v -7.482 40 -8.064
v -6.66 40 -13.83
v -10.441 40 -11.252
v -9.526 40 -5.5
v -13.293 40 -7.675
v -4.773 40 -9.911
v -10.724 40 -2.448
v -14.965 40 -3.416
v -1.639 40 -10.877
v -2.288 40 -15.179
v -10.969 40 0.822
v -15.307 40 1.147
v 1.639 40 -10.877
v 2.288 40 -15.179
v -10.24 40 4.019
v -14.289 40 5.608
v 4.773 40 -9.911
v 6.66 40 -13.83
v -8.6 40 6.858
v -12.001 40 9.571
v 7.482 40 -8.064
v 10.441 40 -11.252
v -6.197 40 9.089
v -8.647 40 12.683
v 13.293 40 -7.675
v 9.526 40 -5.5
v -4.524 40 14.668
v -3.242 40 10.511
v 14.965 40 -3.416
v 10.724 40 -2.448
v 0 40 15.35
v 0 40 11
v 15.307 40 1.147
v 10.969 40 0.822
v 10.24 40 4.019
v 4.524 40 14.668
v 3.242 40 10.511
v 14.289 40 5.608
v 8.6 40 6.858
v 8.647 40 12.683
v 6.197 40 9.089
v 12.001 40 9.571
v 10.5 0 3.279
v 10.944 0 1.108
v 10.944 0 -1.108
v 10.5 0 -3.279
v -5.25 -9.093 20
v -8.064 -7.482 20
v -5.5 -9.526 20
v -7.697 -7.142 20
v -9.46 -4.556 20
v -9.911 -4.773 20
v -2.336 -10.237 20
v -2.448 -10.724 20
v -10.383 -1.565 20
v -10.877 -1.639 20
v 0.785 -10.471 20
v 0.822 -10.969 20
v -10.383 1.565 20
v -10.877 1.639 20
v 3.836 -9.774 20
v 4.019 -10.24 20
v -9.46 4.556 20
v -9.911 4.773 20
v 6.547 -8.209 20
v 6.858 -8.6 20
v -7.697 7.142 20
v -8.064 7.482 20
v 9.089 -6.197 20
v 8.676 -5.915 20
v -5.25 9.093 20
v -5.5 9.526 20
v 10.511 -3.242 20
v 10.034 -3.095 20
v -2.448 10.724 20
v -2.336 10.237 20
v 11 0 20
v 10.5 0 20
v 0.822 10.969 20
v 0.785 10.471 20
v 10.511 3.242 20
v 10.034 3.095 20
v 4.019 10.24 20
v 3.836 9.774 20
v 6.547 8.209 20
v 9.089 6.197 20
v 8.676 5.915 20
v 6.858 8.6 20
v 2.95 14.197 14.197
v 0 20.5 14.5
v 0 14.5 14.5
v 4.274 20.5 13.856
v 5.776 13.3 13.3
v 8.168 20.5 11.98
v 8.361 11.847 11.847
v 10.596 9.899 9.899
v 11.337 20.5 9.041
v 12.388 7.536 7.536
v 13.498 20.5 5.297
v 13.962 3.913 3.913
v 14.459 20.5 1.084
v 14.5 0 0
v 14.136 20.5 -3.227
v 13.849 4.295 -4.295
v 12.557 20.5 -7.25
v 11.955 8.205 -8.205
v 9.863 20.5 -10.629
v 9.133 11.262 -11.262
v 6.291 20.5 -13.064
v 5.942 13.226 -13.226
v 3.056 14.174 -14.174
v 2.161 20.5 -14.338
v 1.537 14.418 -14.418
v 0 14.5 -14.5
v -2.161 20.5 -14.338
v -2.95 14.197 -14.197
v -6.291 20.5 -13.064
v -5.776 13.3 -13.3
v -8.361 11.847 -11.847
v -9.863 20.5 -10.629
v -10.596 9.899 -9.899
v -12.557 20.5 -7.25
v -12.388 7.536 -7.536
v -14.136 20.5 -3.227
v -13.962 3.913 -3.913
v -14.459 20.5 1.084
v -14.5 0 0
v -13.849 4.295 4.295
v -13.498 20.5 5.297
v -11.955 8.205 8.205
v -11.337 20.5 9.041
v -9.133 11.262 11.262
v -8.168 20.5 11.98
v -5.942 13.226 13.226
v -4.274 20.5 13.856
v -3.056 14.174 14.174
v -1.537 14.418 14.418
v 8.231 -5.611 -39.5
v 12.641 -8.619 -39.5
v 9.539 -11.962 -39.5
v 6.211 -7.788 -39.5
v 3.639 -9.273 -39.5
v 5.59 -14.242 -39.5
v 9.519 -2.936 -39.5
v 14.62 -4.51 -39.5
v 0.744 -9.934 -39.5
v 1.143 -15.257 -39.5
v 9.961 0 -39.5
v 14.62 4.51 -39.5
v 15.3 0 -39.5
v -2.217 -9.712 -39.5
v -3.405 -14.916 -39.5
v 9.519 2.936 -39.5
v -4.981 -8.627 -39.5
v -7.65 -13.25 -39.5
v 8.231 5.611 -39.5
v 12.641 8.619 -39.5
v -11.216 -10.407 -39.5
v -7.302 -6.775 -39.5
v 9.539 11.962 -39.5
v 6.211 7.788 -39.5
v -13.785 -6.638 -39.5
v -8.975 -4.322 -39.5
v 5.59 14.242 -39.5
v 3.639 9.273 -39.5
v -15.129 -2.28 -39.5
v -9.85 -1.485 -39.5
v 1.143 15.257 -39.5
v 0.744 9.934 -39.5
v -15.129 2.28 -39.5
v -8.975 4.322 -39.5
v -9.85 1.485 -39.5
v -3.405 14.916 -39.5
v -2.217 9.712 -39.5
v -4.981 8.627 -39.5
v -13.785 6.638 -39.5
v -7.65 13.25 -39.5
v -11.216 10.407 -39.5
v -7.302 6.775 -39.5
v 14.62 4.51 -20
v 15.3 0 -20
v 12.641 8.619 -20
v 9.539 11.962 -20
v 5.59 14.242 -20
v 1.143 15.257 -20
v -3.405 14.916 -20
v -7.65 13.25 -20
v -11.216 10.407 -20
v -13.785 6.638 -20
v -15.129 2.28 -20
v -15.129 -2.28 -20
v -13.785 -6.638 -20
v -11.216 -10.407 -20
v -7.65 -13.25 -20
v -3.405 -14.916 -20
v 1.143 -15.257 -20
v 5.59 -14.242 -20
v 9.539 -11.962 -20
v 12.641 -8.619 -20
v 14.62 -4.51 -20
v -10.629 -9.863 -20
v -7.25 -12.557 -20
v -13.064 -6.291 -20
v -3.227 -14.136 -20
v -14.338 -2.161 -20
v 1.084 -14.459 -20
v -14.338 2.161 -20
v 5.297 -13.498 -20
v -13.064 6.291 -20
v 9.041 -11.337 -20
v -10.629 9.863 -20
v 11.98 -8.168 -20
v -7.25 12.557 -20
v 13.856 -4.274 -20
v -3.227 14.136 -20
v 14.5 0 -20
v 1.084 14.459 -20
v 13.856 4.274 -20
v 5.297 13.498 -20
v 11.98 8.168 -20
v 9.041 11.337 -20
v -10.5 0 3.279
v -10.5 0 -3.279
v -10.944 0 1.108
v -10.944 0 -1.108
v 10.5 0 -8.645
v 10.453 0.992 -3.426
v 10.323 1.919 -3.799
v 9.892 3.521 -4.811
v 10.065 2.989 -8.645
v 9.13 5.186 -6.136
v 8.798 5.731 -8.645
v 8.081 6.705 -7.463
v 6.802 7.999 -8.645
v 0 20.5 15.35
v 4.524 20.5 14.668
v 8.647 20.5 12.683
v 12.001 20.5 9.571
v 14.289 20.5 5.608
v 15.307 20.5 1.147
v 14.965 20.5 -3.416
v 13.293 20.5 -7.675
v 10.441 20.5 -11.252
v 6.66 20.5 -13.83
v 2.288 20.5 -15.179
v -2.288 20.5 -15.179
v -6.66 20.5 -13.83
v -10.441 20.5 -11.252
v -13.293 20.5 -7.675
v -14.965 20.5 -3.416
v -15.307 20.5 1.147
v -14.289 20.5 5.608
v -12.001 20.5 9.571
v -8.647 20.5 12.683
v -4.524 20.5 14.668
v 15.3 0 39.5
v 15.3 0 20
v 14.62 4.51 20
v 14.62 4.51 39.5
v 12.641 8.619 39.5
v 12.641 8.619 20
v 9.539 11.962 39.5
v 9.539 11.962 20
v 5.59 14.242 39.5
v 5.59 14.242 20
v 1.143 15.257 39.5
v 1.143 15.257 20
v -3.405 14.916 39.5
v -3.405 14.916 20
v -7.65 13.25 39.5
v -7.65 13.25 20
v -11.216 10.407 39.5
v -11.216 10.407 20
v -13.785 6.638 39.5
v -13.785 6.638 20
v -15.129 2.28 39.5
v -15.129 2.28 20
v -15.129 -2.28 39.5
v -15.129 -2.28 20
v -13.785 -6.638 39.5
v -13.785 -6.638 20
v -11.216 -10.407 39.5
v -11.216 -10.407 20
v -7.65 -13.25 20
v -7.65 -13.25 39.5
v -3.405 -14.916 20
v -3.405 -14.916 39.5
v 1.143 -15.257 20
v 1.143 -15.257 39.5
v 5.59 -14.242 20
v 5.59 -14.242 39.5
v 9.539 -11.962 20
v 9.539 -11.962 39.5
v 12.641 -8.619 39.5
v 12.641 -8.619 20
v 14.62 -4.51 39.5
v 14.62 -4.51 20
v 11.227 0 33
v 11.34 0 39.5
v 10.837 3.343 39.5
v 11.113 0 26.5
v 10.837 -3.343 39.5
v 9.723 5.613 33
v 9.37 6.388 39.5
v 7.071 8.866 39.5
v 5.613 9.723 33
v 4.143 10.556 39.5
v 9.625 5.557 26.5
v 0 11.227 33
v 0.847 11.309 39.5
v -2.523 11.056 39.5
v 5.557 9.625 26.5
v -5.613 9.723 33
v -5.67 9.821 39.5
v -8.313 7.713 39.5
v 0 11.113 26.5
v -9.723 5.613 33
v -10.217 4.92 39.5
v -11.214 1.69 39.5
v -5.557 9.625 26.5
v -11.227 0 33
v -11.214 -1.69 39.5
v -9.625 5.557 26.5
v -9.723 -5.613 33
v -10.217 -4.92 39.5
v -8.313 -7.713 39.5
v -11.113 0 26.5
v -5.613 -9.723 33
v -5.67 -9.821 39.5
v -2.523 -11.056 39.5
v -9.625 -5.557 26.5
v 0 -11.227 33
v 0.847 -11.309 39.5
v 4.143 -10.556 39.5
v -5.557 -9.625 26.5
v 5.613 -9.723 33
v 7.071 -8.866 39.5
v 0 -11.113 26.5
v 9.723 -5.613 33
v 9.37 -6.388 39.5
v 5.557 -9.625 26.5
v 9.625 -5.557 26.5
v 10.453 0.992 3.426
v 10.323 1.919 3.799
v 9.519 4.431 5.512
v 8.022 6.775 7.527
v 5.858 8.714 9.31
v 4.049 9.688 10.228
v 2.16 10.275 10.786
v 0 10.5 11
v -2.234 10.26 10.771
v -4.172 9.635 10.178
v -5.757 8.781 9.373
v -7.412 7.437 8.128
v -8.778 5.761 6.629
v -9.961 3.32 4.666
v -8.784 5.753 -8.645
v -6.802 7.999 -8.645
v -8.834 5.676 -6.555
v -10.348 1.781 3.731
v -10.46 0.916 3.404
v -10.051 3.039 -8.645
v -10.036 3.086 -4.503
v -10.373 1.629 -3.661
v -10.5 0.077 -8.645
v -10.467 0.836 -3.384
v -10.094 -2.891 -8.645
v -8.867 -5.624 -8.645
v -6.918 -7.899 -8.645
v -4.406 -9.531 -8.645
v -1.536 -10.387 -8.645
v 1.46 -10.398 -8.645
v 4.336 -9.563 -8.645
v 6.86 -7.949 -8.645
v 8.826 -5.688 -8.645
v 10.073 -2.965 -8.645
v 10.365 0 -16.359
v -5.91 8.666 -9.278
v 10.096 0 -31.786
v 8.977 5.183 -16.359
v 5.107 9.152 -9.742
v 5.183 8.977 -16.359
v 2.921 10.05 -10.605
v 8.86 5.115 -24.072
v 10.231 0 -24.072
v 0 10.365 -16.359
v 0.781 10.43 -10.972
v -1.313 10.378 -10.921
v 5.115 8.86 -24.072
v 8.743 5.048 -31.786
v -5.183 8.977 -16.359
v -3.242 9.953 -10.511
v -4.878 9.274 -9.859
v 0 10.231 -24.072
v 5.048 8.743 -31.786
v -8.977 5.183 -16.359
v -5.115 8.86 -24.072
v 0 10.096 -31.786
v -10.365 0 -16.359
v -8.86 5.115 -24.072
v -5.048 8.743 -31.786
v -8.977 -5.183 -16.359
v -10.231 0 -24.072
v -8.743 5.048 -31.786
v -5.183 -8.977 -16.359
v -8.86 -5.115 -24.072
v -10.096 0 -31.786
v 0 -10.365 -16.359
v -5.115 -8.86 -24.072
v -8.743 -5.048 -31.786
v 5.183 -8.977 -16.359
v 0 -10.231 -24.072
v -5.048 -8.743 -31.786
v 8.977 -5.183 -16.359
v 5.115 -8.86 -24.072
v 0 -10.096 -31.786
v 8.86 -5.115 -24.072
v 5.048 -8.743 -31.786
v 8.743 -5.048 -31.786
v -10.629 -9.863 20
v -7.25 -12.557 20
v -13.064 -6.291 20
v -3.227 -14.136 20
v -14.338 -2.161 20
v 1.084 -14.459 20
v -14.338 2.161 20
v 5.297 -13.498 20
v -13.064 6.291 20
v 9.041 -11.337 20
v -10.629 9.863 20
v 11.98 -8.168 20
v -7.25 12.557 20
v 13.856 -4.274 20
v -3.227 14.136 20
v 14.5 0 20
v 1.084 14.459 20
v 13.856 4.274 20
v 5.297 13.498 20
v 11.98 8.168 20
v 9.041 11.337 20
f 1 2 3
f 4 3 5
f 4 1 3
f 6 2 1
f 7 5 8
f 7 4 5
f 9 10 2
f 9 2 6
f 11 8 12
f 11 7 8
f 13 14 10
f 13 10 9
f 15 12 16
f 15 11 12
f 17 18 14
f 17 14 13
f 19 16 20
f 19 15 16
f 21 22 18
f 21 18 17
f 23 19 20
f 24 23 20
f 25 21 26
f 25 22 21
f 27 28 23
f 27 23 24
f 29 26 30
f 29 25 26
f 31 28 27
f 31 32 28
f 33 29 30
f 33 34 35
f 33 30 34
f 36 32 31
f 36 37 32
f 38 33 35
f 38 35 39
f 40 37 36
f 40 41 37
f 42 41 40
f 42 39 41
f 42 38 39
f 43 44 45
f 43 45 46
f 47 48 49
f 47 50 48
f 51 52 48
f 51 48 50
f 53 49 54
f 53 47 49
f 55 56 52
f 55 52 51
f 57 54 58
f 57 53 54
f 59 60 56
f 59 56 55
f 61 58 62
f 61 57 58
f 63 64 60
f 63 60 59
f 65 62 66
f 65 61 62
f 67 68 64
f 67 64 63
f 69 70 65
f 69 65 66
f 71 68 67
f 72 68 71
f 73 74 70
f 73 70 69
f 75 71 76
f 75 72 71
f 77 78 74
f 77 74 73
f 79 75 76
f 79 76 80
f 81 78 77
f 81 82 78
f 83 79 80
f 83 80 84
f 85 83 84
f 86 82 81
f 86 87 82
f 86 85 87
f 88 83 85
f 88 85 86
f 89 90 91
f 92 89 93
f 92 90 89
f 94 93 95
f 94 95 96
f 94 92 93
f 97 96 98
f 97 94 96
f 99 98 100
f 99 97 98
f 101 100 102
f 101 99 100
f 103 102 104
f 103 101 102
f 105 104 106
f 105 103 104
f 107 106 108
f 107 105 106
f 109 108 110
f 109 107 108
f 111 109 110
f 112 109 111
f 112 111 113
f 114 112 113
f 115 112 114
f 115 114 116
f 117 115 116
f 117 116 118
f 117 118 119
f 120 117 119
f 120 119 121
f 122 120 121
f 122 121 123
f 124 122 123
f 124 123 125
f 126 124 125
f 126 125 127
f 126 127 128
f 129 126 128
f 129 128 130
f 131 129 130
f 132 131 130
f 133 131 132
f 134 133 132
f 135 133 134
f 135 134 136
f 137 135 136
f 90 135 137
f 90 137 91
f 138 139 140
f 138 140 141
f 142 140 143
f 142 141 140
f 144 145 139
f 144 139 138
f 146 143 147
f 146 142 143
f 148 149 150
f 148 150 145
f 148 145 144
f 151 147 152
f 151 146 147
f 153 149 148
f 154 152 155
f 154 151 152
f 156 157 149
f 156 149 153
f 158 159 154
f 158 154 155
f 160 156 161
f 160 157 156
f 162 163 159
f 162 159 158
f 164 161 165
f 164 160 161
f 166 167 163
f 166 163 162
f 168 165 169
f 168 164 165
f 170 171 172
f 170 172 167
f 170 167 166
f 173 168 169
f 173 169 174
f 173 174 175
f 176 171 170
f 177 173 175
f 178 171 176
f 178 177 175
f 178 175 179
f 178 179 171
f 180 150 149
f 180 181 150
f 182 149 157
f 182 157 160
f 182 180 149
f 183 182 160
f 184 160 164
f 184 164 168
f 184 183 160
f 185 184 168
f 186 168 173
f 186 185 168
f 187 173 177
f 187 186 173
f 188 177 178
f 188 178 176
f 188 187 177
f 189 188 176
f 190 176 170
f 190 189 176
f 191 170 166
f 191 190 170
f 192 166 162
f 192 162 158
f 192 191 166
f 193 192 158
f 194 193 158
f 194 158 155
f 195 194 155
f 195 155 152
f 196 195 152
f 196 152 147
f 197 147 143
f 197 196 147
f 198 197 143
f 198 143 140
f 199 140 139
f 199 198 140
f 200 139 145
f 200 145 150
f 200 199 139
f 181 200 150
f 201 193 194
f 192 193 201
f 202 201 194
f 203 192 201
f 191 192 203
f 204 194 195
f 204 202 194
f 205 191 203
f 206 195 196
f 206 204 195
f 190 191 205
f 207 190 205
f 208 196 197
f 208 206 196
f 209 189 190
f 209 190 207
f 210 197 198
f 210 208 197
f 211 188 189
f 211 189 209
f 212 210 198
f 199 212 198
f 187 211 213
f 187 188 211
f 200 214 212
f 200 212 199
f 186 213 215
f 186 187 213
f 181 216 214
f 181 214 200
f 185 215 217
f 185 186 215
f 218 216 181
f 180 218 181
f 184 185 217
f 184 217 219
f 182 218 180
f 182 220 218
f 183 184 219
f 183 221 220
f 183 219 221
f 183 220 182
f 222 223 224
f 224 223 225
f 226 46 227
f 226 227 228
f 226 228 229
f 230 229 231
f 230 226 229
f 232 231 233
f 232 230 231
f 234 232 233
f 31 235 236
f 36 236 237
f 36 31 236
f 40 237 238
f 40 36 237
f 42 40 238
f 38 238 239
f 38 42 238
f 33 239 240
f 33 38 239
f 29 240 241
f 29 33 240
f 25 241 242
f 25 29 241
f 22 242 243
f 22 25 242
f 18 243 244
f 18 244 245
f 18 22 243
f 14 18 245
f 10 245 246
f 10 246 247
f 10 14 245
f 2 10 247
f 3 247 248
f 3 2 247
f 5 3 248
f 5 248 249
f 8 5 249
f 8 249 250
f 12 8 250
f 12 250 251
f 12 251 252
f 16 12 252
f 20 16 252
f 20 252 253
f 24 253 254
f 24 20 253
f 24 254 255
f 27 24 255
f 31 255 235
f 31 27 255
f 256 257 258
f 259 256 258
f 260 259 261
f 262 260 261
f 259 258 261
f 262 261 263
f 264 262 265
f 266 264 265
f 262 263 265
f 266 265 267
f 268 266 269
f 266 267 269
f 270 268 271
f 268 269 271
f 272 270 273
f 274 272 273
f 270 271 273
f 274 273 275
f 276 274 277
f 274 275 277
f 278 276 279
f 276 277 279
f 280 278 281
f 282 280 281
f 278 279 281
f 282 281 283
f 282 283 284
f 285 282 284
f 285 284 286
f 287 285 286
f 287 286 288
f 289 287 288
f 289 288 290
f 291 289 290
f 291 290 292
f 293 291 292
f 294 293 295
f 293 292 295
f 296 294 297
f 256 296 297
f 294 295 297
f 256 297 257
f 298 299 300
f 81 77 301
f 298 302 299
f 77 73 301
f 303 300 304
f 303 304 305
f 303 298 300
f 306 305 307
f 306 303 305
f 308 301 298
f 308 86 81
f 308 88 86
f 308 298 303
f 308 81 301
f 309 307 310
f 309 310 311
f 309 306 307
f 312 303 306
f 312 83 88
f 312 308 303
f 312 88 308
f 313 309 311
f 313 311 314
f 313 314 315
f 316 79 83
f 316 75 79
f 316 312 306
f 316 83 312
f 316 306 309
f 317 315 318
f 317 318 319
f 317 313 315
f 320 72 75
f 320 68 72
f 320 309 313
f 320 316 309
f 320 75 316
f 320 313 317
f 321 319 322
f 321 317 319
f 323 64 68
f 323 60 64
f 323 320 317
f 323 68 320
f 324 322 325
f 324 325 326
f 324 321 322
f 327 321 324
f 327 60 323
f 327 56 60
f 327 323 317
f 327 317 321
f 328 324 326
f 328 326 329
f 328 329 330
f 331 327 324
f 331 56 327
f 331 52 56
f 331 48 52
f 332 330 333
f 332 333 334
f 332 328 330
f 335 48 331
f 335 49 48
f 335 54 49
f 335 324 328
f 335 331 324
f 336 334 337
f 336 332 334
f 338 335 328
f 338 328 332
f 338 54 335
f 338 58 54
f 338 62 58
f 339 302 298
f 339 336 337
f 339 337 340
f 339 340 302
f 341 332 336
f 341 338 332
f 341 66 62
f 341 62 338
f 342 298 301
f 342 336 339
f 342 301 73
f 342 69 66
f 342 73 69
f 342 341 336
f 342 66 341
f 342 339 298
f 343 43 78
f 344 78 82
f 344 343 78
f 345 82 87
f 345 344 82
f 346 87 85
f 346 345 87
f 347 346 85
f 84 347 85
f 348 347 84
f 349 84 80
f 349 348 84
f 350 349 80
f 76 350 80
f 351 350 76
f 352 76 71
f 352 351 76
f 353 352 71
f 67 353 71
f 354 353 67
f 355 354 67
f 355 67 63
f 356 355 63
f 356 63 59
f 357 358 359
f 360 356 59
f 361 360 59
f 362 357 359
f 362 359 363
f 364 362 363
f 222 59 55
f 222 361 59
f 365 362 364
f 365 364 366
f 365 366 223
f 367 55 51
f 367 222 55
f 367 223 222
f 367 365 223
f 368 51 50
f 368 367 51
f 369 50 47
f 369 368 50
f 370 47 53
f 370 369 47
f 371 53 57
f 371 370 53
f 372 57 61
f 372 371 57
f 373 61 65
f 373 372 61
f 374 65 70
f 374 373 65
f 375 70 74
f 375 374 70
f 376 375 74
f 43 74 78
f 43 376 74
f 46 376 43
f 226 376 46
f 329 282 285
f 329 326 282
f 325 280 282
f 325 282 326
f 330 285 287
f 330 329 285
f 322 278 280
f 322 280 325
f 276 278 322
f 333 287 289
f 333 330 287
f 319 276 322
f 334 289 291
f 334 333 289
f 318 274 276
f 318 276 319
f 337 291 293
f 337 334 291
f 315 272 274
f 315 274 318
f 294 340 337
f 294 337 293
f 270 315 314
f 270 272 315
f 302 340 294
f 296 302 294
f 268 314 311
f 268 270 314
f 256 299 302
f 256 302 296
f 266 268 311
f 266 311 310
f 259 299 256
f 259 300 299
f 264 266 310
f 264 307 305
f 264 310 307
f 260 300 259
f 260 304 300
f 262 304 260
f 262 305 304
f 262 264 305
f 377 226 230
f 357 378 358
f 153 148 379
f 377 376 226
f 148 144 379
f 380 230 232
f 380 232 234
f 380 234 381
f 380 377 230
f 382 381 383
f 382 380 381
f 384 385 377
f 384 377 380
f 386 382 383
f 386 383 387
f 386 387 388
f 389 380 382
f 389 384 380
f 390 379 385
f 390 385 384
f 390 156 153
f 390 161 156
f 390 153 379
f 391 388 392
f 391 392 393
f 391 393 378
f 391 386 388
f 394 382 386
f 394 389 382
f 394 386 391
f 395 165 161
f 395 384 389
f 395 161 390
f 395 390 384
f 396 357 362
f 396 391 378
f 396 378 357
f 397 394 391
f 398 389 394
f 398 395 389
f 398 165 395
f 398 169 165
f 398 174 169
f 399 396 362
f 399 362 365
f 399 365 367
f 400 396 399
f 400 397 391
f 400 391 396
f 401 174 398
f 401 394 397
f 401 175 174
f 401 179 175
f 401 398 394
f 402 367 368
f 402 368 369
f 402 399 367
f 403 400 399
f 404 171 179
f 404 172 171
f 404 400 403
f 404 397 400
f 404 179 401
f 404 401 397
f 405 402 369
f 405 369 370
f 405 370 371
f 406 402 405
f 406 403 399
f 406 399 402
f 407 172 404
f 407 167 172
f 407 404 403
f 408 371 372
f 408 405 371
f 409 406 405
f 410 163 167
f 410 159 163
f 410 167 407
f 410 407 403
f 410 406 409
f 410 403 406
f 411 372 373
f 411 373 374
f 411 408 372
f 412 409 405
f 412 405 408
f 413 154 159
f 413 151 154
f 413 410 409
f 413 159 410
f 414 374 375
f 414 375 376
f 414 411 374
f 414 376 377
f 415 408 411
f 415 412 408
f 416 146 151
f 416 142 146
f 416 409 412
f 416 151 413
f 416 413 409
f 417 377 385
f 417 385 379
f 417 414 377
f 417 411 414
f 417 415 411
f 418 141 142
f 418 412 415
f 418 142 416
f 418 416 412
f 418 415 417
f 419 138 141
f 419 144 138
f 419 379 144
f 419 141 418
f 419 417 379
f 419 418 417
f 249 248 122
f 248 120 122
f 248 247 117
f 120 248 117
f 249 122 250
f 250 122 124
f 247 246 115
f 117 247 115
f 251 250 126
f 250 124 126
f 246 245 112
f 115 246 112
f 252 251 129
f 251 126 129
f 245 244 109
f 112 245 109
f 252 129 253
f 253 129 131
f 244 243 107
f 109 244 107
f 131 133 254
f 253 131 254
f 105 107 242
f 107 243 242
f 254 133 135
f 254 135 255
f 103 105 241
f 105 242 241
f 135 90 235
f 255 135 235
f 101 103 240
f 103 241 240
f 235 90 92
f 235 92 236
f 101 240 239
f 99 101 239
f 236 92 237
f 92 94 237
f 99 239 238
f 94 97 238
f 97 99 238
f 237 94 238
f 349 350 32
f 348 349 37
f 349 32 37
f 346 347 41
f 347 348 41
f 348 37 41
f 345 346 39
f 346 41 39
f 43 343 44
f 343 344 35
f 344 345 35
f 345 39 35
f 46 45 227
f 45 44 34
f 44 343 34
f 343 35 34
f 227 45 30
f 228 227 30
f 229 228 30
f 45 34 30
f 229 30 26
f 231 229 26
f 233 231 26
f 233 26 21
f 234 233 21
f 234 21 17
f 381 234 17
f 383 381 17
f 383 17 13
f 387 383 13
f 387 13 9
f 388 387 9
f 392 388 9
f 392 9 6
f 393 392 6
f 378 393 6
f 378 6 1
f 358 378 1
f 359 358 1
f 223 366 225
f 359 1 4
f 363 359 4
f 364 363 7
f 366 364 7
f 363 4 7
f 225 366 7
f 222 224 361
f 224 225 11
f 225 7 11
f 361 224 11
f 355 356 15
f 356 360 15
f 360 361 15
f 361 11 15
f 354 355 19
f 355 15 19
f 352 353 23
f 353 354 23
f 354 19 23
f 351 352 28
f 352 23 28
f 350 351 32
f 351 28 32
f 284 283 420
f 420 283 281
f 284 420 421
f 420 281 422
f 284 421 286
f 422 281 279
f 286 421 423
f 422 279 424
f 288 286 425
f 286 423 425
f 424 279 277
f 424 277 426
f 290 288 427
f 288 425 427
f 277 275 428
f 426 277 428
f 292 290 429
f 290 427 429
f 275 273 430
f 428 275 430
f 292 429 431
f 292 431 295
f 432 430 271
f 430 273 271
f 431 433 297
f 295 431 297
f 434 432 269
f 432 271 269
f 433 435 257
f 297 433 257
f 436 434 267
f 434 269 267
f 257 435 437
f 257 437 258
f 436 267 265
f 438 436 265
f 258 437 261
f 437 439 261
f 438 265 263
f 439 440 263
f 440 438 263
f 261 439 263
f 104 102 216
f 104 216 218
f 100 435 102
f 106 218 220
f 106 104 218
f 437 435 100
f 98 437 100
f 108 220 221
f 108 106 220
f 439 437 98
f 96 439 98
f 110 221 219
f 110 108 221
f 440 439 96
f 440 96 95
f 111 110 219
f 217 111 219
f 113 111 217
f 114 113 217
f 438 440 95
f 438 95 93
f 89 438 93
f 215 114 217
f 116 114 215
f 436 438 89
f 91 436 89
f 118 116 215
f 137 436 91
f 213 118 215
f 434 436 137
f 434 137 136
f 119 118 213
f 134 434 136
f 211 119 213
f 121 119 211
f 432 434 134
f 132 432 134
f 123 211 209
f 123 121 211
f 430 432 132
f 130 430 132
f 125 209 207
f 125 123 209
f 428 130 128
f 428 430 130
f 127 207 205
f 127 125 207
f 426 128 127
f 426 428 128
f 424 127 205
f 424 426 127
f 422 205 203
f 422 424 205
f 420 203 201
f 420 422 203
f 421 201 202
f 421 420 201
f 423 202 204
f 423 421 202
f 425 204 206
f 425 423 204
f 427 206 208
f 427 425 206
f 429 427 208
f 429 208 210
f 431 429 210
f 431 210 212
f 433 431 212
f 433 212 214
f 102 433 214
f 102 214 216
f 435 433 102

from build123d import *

# Parameters (mm, degrees)
SKETCH1_R                = 14.5
SKETCH1_R_2              = 10.5
BOSS_EXTRUDE1_DEPTH      = 20
SKETCH2_R                = 15.3
SKETCH2_R_2              = 11
BOSS_EXTRUDE2_DEPTH      = 19.5
DRAFT1_ANGLE             = 1
BOSS_EXTRUDE3_REACH      = 71.659
BOSS_EXTRUDE3_END_RADIUS = 14.5
SKETCH4_R                = 14.5
SKETCH5_R                = 15.35
BOSS_EXTRUDE4_DEPTH      = 19.5
SKETCH6_R                = 11
CUT_EXTRUDE1_DEPTH       = 40


# Read off the part's stored shape, not the designer's step: Mirror1
with BuildPart() as part:
    # Sketch1 → Boss-Extrude1 (new, symmetric)
    with BuildSketch(Plane.XY):
        Circle(SKETCH1_R)
        Circle(SKETCH1_R_2, mode=Mode.SUBTRACT)
    extrude(amount=BOSS_EXTRUDE1_DEPTH, both=True)

    # Sketch2 → Boss-Extrude2 (add)
    with BuildSketch(Plane.XY.offset(20)):
        Circle(SKETCH2_R)
        Circle(SKETCH2_R_2, mode=Mode.SUBTRACT)
    extrude(amount=BOSS_EXTRUDE2_DEPTH)

    # Draft1
    draft1_faces = [part.faces().sort_by_distance(p)[0] for p in [
        (-11, 0, 29.75),
    ]]
    draft(draft1_faces, Plane.XY.offset(20), DRAFT1_ANGLE)

    # Mirror1 outline → Mirror1 (revolve)
    with BuildSketch(Plane.XZ):
        Polygon((15.3, -39.5), (15.3, -20), (10.5, -20), (10.5, -8.644980815), (9.961423637, -39.5), align=None)
    revolve(axis=Axis((0, 0, 0), (0, 0, 1)))

    # Boss-Extrude3: up to this cylinder (the profile starts outside it)
    boss_extrude3_end = Plane(origin=(0, 0, 0), z_dir=(0, 0, -1)) * Cylinder(BOSS_EXTRUDE3_END_RADIUS, 173.318, mode=Mode.PRIVATE)
    # Sketch4 → Boss-Extrude3 (add, up to the surface)
    with BuildSketch(Plane(origin=(0, 40, 0), x_dir=(1, 0, 0), z_dir=(0, 1, 0)), mode=Mode.PRIVATE) as boss_extrude3_sk1:
        with Locations(Location((0, 0, 0), (0, 0, 270))):
            Circle(SKETCH4_R)
    boss_extrude3_tool1 = extrude(boss_extrude3_sk1.sketch, amount=-BOSS_EXTRUDE3_REACH, mode=Mode.PRIVATE) - boss_extrude3_end
    add(boss_extrude3_tool1.solids().sort_by_distance((0, 40, 0))[0])

    # Sketch5 → Boss-Extrude4 (add)
    with BuildSketch(Plane(origin=(0, 40, 0), x_dir=(1, 0, 0), z_dir=(0, 1, 0))):
        with Locations(Location((0, 0, 0), (0, 0, 270))):
            Circle(SKETCH5_R)
    extrude(amount=-BOSS_EXTRUDE4_DEPTH)

    # Sketch6 → Cut-Extrude1 (cut)
    with BuildSketch(Plane(origin=(0, 40, 0), x_dir=(1, 0, 0), z_dir=(0, 1, 0))):
        with Locations(Location((0, 0, 0), (0, 0, 270))):
            Circle(SKETCH6_R)
    extrude(amount=-CUT_EXTRUDE1_DEPTH, mode=Mode.SUBTRACT)


solid = part.part
